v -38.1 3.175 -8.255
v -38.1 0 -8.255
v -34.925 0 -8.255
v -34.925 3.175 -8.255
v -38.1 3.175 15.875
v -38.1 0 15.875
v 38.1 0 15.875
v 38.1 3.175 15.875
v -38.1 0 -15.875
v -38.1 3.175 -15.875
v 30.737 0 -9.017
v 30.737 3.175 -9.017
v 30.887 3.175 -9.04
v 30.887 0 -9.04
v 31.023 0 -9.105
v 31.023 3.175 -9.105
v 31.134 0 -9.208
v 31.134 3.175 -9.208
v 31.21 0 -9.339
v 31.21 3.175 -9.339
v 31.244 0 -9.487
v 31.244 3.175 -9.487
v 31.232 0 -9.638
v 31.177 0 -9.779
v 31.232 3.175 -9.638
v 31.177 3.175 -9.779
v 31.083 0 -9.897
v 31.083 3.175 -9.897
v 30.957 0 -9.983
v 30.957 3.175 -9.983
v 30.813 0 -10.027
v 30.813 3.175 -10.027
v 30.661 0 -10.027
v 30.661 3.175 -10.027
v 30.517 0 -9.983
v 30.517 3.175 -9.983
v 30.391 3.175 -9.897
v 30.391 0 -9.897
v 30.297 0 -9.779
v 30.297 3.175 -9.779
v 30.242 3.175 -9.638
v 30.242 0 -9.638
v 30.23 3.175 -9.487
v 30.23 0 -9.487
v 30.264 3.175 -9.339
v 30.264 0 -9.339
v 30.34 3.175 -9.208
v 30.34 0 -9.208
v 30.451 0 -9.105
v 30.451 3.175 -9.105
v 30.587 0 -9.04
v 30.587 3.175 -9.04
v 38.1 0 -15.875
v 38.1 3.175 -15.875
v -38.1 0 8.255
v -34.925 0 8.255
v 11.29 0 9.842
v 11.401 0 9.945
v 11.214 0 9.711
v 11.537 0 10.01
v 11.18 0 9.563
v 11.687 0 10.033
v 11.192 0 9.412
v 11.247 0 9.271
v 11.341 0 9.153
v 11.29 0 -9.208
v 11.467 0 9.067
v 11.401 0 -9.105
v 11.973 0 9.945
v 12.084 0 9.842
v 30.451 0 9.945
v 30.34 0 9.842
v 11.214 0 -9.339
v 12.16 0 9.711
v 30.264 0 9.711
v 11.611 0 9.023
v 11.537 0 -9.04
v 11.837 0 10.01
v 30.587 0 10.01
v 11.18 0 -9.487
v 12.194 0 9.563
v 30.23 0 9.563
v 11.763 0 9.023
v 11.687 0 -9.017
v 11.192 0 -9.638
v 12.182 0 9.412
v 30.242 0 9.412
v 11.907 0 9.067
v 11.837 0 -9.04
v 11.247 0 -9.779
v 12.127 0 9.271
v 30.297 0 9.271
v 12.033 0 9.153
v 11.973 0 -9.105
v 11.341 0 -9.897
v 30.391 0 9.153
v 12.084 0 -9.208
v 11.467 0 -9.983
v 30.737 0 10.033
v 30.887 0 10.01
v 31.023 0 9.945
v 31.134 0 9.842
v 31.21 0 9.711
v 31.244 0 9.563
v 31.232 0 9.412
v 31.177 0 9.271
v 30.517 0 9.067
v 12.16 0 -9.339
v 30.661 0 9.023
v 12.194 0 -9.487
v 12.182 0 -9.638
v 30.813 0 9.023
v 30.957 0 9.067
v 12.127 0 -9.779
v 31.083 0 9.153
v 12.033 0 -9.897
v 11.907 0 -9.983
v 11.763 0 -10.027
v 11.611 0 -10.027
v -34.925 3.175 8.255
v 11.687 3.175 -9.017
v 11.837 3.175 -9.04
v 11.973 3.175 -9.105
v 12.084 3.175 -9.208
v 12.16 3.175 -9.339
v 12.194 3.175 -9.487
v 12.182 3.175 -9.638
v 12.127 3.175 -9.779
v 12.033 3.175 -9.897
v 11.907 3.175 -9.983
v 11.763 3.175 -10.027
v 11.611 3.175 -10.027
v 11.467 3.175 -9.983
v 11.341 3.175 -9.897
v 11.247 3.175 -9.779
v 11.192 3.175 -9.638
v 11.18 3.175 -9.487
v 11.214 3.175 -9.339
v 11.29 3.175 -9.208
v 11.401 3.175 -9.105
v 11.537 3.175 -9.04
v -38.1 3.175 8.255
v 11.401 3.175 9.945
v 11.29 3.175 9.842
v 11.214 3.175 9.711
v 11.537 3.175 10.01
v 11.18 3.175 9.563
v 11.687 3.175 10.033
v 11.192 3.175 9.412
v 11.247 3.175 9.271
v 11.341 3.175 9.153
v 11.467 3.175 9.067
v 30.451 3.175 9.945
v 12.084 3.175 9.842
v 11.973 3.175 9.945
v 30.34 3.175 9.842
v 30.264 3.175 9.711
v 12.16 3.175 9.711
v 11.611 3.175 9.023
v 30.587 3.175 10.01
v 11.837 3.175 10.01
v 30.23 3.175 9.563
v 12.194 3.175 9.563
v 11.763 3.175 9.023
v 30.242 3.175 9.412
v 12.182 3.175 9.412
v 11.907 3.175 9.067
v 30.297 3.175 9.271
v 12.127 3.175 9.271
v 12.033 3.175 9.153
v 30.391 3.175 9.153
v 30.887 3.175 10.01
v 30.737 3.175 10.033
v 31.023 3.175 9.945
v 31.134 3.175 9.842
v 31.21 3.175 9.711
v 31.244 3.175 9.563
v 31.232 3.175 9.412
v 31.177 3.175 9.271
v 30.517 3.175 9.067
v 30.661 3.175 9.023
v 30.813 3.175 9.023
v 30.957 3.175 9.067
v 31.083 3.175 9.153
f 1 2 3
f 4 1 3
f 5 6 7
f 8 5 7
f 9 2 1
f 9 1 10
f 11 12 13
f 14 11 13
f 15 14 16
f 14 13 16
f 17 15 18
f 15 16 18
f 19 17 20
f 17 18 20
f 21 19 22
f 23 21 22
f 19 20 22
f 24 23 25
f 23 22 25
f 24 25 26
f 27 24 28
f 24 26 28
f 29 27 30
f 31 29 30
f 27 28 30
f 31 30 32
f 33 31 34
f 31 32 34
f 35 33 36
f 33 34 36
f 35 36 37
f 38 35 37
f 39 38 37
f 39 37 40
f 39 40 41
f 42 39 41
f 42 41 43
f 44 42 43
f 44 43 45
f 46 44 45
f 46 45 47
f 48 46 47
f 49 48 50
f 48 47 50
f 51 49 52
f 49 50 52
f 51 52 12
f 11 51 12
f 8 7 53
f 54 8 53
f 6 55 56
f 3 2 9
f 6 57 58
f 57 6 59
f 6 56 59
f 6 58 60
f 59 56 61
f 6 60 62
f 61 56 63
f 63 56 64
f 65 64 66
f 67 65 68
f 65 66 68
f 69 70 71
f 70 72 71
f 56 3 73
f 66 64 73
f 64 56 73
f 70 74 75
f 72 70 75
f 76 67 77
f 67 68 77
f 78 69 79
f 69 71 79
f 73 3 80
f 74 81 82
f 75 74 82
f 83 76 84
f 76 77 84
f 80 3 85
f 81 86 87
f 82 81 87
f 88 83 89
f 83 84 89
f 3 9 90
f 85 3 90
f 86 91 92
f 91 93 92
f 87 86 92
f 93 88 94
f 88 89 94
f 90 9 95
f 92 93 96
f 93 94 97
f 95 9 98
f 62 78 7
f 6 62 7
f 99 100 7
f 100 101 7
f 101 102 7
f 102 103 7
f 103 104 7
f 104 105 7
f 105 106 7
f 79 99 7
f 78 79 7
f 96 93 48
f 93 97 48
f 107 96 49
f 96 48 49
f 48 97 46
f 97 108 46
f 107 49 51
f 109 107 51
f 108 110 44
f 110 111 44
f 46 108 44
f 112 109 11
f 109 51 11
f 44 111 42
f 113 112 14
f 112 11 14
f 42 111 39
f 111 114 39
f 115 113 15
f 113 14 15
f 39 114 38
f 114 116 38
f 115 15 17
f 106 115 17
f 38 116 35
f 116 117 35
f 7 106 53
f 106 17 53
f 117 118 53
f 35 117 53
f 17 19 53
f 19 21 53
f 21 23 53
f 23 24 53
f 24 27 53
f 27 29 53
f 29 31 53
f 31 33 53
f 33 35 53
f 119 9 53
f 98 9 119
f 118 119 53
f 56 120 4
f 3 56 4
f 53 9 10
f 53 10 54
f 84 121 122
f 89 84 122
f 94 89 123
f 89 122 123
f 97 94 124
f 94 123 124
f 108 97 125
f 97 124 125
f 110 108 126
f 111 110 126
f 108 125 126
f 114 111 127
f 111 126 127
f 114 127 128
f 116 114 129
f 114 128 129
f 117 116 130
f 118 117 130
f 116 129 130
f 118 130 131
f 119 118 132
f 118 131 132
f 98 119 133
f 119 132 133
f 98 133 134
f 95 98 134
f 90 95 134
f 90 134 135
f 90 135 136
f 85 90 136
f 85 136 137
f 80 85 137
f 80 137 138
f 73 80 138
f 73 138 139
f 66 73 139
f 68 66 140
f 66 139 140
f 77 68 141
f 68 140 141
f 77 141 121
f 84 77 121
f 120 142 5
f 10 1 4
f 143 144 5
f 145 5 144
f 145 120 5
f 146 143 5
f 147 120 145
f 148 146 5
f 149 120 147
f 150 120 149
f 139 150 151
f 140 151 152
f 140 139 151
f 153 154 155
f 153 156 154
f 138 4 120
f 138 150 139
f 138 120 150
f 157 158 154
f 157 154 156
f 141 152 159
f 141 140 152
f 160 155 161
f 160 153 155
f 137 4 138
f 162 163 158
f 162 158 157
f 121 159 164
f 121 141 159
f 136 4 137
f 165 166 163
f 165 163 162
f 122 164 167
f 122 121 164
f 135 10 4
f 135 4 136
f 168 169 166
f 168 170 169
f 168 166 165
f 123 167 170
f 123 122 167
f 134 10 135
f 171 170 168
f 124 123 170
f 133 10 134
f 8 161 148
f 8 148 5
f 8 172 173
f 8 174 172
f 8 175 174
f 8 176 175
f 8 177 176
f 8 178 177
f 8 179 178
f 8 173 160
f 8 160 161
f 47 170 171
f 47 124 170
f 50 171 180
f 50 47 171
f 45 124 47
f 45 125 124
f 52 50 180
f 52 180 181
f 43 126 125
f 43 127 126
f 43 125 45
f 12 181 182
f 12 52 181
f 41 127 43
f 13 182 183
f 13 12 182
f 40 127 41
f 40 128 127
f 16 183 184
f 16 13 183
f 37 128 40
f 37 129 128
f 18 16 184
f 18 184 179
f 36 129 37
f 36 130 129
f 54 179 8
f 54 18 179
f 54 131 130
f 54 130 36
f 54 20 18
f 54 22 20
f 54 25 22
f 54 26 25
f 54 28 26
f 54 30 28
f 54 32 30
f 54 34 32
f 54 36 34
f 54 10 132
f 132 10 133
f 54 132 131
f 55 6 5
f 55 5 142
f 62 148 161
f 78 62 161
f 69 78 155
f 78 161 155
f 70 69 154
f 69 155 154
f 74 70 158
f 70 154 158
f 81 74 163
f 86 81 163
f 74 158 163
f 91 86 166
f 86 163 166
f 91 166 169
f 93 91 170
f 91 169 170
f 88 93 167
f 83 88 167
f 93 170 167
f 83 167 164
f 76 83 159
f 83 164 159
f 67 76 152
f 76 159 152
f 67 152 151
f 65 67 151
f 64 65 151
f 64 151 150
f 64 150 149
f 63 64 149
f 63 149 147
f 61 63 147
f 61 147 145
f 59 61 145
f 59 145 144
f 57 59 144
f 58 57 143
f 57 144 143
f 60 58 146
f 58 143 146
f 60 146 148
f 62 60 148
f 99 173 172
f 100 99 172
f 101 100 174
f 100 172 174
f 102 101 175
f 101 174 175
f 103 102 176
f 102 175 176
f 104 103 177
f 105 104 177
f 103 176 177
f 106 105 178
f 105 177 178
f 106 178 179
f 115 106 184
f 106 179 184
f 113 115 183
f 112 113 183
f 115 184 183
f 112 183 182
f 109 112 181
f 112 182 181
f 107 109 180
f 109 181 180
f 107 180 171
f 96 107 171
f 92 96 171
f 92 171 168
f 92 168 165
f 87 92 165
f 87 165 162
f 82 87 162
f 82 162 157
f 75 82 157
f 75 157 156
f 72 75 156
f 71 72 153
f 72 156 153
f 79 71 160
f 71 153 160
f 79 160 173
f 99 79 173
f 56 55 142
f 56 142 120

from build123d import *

# Parameters (mm, degrees)
SKETCH1_W           = 76.2
SKETCH1_H           = 31.75
BOSS_EXTRUDE1_DEPTH = 3.175
SKETCH2_R           = 0.508
SKETCH2_W           = 3.175
SKETCH2_H           = 16.51
CUT_EXTRUDE1_DEPTH  = 3.175


with BuildPart() as part:
    # Sketch1 → Boss-Extrude1 (new body)
    with BuildSketch(Plane(origin=(0, 0, 0), x_dir=(1, 0, 0), z_dir=(0, 1, 0))):
        Rectangle(SKETCH1_W, SKETCH1_H)
    extrude(amount=BOSS_EXTRUDE1_DEPTH)

    # Sketch2 → Cut-Extrude1 (cut)
    with BuildSketch(Plane(origin=(0, 3.175, 0), x_dir=(1, 0, 0), z_dir=(0, 1, 0))):
        with Locations(Location((30.737005641, 9.525, 0), (0, 0, 270))):
            Circle(SKETCH2_R)
        with Locations(Location((30.737005641, -9.525, 0), (0, 0, 270))):
            Circle(SKETCH2_R)
        with Locations(Location((11.687005641, 9.525, 0), (0, 0, 270))):
            Circle(SKETCH2_R)
        with Locations(Location((11.687005641, -9.525, 0), (0, 0, 270))):
            Circle(SKETCH2_R)
        with Locations((-36.5125, 0)):
            Rectangle(SKETCH2_W, SKETCH2_H)
    extrude(amount=-CUT_EXTRUDE1_DEPTH, mode=Mode.SUBTRACT)


solid = part.part
